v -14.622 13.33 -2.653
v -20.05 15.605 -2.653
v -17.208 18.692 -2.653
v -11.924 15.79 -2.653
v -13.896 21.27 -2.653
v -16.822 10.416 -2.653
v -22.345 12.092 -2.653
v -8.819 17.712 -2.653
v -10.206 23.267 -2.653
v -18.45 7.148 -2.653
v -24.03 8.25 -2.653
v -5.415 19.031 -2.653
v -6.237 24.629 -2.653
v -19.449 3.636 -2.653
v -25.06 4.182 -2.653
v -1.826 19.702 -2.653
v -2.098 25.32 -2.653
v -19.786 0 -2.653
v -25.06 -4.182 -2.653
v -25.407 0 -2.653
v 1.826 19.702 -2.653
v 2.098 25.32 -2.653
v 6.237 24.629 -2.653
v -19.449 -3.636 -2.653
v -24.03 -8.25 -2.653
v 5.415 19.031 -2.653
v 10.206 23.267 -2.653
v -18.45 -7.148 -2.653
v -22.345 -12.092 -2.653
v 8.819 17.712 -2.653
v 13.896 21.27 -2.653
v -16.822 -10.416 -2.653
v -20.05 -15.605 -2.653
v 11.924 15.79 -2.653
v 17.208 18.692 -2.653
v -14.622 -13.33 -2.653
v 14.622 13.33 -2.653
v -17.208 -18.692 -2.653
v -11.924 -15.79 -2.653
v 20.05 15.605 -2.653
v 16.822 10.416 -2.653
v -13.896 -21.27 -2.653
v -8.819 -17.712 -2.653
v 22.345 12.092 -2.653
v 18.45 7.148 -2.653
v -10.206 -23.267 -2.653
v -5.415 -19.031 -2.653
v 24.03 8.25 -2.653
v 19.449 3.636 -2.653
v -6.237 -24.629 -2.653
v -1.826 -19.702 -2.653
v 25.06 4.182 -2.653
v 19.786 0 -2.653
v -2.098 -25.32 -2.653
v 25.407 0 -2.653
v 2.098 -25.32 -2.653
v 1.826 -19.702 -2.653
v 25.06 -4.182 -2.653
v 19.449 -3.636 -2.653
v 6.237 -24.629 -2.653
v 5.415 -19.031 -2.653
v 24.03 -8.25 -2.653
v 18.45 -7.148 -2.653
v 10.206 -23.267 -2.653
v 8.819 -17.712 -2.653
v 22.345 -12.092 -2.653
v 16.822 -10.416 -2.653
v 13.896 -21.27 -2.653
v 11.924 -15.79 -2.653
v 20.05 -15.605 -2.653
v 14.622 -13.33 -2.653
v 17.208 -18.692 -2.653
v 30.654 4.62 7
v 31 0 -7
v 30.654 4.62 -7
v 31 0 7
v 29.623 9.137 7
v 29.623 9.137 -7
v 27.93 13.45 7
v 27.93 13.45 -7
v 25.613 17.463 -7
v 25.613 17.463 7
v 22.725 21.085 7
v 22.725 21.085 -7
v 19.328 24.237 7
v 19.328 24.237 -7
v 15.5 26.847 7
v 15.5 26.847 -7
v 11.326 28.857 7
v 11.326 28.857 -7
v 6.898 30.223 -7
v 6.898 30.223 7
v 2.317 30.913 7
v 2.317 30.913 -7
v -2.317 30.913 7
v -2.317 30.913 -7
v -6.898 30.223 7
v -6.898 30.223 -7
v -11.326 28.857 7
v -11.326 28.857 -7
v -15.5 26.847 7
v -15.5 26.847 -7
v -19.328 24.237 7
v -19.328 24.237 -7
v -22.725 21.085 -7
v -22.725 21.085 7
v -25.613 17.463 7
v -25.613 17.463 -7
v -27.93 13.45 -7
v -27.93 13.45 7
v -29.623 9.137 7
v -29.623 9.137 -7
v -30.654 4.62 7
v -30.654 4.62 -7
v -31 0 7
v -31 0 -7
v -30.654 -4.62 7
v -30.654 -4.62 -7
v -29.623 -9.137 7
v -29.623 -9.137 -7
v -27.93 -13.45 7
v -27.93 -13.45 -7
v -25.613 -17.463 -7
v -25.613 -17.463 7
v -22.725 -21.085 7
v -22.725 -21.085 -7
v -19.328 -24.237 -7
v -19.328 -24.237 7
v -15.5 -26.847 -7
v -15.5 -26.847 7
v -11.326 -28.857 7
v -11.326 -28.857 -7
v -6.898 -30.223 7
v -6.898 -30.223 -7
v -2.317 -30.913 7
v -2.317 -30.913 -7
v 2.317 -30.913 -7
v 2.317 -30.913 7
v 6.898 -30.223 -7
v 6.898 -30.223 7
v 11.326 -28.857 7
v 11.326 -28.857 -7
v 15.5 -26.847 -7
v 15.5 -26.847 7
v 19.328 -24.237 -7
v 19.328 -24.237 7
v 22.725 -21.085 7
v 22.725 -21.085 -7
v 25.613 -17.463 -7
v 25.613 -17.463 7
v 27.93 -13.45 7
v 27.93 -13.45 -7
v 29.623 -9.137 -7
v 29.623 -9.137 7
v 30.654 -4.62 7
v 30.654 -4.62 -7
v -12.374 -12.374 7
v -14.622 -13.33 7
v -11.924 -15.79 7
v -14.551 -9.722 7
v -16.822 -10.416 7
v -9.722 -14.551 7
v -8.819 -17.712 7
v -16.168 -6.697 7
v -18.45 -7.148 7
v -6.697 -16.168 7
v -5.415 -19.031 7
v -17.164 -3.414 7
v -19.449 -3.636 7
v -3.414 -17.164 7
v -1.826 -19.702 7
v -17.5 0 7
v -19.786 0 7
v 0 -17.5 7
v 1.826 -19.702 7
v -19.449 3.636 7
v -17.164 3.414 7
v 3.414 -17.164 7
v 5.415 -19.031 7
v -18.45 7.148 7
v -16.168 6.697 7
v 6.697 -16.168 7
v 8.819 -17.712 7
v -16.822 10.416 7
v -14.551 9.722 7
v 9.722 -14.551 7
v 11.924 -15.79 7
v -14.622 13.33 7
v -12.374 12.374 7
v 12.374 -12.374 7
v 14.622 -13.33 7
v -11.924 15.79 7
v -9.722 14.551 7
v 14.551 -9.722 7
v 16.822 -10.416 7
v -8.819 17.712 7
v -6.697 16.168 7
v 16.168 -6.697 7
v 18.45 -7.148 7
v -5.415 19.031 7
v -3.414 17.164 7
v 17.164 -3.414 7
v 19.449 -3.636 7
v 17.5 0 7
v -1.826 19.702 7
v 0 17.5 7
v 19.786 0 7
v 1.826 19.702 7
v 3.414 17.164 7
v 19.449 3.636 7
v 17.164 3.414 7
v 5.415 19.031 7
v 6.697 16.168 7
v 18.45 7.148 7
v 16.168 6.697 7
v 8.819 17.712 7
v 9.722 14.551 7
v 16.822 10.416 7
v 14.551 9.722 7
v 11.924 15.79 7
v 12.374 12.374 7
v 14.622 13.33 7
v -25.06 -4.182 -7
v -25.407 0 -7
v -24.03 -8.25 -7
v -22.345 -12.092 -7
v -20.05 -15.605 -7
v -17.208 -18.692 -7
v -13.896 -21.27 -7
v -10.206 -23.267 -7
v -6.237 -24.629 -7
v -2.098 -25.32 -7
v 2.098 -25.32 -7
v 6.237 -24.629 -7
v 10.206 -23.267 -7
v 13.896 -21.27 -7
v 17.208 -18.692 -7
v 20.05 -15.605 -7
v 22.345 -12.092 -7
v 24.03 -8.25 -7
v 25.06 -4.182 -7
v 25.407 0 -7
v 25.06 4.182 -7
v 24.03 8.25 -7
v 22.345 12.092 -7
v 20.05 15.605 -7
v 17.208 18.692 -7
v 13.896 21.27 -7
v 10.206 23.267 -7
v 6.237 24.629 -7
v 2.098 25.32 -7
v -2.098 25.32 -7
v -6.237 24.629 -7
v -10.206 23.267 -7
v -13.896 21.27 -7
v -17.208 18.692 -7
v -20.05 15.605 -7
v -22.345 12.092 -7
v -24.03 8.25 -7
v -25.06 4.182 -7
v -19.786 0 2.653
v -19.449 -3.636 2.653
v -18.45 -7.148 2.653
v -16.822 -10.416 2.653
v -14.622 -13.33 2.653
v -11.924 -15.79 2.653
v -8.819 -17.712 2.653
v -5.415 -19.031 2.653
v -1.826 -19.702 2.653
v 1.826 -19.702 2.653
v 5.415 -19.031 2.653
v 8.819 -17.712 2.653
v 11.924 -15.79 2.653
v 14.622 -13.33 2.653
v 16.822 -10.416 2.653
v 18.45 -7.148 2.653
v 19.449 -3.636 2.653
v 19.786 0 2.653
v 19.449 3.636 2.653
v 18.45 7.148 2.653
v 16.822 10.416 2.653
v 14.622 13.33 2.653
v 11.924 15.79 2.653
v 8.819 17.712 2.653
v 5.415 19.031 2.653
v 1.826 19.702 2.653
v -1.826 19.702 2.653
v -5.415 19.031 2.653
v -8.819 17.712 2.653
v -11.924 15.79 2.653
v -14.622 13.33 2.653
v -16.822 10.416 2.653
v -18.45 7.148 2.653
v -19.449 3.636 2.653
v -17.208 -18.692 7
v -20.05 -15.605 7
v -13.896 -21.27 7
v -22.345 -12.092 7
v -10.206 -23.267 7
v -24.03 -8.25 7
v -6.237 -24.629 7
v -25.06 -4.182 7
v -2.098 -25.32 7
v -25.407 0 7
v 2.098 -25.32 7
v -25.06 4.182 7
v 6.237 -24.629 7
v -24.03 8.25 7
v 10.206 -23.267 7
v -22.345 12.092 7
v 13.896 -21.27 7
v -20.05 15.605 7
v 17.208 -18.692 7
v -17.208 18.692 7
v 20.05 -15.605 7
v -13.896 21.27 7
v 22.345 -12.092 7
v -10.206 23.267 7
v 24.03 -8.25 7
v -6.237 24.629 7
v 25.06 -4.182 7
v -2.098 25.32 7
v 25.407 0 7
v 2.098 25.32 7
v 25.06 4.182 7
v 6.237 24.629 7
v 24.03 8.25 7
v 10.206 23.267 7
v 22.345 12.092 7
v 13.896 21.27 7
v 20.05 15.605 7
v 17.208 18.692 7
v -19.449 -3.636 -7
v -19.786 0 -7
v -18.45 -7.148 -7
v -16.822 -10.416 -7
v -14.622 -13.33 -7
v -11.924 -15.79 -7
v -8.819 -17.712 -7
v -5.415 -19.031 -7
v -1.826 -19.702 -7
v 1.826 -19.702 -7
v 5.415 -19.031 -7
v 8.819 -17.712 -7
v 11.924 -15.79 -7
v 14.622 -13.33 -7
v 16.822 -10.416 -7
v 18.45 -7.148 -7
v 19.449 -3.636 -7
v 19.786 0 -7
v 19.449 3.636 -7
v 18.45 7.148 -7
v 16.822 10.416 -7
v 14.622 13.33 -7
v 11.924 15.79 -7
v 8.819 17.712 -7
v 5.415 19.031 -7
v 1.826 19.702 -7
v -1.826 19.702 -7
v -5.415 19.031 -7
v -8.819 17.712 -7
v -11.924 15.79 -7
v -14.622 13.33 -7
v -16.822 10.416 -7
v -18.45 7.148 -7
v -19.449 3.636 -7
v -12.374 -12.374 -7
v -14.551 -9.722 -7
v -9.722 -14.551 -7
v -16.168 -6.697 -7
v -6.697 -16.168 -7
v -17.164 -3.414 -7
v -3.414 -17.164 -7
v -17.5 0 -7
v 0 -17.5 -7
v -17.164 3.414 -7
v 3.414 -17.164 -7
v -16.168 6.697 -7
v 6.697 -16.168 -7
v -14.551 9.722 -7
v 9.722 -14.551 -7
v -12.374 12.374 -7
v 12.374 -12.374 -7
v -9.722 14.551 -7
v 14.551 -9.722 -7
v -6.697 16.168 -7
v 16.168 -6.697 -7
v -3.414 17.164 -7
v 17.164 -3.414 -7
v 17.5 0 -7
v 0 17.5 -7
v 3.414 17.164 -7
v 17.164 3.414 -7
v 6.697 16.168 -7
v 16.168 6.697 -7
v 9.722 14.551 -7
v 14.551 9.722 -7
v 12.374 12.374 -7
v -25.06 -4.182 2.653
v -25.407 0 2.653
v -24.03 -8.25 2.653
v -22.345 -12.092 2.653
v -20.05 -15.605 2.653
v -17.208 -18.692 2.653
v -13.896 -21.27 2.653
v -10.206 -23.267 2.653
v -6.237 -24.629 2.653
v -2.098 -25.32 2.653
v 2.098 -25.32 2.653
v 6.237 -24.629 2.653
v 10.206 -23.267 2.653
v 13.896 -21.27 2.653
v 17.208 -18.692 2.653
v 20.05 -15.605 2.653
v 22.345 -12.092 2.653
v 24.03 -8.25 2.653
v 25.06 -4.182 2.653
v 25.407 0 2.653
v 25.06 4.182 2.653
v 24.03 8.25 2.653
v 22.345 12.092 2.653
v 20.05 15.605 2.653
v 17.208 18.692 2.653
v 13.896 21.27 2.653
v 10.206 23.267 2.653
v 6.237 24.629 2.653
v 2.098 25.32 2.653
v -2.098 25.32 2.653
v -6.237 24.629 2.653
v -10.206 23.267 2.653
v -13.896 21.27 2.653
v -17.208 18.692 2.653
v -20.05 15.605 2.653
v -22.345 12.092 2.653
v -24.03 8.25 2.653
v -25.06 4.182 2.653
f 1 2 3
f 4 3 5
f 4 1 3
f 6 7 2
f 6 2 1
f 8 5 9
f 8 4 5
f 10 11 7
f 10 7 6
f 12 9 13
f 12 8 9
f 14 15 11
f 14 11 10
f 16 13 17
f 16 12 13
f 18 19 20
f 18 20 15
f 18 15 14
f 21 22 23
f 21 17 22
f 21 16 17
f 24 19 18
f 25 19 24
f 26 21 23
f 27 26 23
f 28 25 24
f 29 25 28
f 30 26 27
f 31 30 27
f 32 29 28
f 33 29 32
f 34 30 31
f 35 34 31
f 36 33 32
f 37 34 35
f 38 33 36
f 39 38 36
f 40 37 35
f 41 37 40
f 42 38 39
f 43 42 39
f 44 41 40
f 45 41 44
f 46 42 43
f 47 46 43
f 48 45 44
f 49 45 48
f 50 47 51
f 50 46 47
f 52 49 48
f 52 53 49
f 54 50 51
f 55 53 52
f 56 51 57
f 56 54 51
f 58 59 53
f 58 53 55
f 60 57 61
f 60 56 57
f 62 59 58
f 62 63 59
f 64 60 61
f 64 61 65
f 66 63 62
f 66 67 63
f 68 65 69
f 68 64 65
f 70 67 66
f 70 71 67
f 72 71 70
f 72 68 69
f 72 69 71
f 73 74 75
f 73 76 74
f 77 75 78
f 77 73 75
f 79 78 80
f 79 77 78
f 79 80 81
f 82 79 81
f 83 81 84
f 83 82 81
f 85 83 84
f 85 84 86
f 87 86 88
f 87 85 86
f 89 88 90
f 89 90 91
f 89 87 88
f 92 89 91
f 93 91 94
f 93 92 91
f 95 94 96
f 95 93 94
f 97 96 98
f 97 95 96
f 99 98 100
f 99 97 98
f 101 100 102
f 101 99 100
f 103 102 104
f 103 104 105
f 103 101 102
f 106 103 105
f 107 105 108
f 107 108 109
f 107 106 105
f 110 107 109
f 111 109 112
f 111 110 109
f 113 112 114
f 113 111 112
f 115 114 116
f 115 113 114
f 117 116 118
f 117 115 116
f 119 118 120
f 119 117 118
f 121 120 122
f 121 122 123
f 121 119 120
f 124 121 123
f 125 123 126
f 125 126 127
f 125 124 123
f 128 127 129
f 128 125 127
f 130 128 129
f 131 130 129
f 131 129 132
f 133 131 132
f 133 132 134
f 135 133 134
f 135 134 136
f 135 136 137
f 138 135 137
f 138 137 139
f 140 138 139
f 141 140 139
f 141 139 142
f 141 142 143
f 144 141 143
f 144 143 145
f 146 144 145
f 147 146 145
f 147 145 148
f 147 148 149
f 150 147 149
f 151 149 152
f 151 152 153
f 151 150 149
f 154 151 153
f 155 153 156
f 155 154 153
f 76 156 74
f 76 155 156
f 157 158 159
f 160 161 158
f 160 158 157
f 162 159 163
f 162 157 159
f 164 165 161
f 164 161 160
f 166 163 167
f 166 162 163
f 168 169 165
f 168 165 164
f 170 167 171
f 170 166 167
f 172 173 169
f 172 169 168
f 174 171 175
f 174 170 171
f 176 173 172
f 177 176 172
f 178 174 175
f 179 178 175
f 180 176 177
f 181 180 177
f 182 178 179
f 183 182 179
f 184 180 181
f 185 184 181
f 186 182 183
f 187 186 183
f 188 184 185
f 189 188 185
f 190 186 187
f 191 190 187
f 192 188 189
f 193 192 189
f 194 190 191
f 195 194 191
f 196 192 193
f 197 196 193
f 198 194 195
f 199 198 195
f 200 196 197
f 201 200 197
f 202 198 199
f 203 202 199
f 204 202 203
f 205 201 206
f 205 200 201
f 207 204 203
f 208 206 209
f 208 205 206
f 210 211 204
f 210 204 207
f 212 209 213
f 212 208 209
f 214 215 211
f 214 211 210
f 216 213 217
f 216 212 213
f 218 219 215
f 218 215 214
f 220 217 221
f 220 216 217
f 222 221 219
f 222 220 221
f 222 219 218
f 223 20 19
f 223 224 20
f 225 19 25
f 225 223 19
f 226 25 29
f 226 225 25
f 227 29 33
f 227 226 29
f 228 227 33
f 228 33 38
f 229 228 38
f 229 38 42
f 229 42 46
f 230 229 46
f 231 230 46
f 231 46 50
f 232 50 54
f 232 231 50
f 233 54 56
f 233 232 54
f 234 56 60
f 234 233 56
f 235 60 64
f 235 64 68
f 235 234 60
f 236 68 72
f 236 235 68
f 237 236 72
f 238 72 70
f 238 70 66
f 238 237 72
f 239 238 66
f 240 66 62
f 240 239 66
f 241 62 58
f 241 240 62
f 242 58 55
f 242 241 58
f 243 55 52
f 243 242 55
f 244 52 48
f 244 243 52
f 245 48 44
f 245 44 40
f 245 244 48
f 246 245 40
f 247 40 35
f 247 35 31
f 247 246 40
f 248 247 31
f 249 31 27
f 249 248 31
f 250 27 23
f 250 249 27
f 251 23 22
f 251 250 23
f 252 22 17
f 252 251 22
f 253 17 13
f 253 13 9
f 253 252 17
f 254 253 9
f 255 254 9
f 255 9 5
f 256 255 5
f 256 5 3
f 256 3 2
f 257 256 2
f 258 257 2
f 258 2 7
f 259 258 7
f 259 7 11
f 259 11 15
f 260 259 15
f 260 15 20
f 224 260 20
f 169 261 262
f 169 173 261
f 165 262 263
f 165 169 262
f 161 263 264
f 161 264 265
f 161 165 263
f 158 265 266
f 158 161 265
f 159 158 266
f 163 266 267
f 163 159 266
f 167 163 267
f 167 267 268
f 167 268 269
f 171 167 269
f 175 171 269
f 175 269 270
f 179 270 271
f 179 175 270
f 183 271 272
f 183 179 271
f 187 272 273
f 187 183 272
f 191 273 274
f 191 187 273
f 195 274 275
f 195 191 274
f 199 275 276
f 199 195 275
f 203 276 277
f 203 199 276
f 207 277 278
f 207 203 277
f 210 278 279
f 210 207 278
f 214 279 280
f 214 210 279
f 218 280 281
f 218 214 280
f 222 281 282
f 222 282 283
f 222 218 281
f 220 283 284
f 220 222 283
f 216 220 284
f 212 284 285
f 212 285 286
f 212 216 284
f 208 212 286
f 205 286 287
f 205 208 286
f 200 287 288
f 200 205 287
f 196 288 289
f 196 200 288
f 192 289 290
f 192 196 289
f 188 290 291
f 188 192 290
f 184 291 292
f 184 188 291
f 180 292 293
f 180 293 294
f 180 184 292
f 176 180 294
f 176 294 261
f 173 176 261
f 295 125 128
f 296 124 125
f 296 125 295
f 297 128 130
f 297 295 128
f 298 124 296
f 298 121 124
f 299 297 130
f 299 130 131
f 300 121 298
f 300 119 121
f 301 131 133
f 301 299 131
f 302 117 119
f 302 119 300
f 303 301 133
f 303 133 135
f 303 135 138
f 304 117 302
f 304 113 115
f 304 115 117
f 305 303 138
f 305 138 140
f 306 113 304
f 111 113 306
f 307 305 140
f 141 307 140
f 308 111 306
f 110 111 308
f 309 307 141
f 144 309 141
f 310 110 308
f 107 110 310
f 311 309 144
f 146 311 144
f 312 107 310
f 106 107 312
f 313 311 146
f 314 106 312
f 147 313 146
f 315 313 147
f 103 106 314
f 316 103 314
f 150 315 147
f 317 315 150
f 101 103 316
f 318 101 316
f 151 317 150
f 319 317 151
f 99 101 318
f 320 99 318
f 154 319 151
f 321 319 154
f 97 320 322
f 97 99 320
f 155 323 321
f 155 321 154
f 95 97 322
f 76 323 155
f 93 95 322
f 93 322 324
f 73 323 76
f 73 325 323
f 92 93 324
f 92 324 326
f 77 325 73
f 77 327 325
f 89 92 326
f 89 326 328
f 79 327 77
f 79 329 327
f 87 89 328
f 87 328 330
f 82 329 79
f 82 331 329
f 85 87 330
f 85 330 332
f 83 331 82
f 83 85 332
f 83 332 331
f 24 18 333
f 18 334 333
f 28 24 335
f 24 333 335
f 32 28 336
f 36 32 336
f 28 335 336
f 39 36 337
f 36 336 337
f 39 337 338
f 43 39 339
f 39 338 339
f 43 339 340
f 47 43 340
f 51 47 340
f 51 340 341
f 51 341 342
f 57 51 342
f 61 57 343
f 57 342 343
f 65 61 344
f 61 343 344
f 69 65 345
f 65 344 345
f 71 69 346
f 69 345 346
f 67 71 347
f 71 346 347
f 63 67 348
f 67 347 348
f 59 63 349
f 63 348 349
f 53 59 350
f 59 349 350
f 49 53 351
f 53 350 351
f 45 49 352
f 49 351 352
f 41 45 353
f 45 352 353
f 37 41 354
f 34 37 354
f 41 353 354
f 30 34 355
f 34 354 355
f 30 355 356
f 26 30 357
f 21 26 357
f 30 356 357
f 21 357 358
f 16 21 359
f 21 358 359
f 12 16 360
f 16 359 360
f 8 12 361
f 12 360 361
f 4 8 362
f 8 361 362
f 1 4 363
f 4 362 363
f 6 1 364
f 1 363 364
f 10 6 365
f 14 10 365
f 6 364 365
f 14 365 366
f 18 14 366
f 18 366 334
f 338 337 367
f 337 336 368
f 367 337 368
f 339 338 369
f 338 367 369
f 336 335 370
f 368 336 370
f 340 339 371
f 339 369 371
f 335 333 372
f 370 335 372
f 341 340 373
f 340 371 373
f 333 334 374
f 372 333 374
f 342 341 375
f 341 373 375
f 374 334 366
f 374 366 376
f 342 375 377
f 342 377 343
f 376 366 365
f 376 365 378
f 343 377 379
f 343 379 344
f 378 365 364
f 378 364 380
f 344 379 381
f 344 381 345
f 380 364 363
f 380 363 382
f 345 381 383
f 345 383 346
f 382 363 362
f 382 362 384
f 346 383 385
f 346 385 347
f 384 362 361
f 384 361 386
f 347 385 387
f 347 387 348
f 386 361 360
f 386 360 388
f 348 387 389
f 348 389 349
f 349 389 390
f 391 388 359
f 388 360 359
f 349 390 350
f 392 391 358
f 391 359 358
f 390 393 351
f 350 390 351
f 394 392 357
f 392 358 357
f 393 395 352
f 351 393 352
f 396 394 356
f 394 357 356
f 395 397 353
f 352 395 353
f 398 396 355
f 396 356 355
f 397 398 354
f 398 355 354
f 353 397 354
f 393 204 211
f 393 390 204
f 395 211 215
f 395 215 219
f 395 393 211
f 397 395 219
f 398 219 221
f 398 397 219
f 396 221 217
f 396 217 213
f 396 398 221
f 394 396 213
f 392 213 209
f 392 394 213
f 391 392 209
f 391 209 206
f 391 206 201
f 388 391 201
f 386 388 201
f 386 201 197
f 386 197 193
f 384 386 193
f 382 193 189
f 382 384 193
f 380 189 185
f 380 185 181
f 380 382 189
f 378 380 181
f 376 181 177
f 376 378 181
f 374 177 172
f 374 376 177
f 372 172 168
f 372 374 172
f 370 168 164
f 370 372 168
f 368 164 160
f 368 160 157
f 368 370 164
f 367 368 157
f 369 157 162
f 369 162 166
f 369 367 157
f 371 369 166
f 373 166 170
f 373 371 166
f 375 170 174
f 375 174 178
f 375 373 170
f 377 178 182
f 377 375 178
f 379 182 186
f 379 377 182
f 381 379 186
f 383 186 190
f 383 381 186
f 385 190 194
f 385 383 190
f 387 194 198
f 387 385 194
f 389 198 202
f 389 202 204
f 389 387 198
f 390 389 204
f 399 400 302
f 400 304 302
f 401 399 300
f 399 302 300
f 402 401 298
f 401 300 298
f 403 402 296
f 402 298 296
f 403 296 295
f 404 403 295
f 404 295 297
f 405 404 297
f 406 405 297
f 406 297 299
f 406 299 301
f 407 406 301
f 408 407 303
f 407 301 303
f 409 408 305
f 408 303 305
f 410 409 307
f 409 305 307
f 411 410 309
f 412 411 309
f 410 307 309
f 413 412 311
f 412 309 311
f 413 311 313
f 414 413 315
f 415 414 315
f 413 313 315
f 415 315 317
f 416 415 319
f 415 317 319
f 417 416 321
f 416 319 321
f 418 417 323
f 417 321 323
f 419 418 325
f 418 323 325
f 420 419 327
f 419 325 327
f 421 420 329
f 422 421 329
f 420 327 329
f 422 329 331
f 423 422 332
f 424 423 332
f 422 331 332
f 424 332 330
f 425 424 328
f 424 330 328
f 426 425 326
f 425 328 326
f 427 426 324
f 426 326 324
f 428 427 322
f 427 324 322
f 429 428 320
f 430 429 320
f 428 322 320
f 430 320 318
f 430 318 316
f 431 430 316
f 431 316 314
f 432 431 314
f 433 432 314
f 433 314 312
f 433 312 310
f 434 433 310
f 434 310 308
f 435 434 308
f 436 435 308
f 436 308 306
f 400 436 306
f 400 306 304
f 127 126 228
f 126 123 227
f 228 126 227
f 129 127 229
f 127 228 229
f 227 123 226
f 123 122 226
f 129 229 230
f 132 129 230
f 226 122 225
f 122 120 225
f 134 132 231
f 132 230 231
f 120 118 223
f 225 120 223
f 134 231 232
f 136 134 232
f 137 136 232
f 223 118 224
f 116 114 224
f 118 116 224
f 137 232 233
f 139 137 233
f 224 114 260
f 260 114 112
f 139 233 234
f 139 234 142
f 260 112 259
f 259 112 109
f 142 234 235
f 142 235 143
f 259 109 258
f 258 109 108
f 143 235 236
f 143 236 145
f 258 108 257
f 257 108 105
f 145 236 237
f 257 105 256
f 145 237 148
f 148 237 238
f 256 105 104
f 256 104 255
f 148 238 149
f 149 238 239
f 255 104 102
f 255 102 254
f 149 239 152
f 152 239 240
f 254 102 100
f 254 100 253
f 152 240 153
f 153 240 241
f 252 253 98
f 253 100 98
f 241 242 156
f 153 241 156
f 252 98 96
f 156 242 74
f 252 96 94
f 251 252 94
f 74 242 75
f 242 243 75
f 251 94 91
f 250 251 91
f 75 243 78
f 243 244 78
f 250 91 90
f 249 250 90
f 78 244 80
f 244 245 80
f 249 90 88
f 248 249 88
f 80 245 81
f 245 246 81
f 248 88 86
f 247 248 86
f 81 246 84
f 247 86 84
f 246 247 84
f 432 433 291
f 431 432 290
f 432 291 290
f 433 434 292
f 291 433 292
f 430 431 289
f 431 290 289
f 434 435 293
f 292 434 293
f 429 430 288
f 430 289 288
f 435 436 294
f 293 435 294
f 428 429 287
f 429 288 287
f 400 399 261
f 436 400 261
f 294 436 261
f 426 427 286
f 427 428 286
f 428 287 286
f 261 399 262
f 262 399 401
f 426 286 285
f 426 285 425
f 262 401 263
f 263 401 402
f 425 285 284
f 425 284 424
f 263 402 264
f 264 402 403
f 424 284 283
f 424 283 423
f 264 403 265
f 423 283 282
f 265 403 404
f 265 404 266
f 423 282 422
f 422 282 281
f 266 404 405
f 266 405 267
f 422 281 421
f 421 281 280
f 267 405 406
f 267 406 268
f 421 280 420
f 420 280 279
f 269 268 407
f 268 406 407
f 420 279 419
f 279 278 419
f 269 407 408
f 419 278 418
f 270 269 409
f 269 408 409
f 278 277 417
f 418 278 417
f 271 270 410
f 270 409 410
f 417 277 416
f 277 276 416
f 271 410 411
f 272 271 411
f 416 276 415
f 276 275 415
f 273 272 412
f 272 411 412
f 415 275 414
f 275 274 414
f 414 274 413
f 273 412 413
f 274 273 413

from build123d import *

# Parameters (mm, degrees)
SKETCH_1_R      = 31
SKETCH_1_R_2    = 17.5
EXTRUDE_1_DEPTH = 7
SKETCH_2_W      = 5.621005066
SKETCH_2_H      = 4.346885609


with BuildPart() as part:
    # 草图1 → 凸台-拉伸1 (new, symmetric)
    with BuildSketch(Plane.XY):
        Circle(SKETCH_1_R)
        Circle(SKETCH_1_R_2, mode=Mode.SUBTRACT)
    extrude(amount=EXTRUDE_1_DEPTH, both=True)

    # 草图2 → 切除-旋转1 (revolve, cut)
    with BuildSketch(Plane(origin=(0, 0, 0), x_dir=(1, 0, 0), z_dir=(0, 1, 0)), mode=Mode.PRIVATE) as cut_revolve_1_sk:
        with Locations((22.596440368, 4.826557196)):
            Rectangle(SKETCH_2_W, SKETCH_2_H)
    cut_revolve_1 = revolve(cut_revolve_1_sk.sketch.rotate(Axis((0, 0, -7), (0, 0, 1)), 180), axis=Axis((0, 0, -7), (0, 0, 1)), mode=Mode.SUBTRACT)

    # 镜向1: 切除-旋转1 across plane
    add(cut_revolve_1.mirror(Plane.XY), mode=Mode.SUBTRACT)


solid = part.part
